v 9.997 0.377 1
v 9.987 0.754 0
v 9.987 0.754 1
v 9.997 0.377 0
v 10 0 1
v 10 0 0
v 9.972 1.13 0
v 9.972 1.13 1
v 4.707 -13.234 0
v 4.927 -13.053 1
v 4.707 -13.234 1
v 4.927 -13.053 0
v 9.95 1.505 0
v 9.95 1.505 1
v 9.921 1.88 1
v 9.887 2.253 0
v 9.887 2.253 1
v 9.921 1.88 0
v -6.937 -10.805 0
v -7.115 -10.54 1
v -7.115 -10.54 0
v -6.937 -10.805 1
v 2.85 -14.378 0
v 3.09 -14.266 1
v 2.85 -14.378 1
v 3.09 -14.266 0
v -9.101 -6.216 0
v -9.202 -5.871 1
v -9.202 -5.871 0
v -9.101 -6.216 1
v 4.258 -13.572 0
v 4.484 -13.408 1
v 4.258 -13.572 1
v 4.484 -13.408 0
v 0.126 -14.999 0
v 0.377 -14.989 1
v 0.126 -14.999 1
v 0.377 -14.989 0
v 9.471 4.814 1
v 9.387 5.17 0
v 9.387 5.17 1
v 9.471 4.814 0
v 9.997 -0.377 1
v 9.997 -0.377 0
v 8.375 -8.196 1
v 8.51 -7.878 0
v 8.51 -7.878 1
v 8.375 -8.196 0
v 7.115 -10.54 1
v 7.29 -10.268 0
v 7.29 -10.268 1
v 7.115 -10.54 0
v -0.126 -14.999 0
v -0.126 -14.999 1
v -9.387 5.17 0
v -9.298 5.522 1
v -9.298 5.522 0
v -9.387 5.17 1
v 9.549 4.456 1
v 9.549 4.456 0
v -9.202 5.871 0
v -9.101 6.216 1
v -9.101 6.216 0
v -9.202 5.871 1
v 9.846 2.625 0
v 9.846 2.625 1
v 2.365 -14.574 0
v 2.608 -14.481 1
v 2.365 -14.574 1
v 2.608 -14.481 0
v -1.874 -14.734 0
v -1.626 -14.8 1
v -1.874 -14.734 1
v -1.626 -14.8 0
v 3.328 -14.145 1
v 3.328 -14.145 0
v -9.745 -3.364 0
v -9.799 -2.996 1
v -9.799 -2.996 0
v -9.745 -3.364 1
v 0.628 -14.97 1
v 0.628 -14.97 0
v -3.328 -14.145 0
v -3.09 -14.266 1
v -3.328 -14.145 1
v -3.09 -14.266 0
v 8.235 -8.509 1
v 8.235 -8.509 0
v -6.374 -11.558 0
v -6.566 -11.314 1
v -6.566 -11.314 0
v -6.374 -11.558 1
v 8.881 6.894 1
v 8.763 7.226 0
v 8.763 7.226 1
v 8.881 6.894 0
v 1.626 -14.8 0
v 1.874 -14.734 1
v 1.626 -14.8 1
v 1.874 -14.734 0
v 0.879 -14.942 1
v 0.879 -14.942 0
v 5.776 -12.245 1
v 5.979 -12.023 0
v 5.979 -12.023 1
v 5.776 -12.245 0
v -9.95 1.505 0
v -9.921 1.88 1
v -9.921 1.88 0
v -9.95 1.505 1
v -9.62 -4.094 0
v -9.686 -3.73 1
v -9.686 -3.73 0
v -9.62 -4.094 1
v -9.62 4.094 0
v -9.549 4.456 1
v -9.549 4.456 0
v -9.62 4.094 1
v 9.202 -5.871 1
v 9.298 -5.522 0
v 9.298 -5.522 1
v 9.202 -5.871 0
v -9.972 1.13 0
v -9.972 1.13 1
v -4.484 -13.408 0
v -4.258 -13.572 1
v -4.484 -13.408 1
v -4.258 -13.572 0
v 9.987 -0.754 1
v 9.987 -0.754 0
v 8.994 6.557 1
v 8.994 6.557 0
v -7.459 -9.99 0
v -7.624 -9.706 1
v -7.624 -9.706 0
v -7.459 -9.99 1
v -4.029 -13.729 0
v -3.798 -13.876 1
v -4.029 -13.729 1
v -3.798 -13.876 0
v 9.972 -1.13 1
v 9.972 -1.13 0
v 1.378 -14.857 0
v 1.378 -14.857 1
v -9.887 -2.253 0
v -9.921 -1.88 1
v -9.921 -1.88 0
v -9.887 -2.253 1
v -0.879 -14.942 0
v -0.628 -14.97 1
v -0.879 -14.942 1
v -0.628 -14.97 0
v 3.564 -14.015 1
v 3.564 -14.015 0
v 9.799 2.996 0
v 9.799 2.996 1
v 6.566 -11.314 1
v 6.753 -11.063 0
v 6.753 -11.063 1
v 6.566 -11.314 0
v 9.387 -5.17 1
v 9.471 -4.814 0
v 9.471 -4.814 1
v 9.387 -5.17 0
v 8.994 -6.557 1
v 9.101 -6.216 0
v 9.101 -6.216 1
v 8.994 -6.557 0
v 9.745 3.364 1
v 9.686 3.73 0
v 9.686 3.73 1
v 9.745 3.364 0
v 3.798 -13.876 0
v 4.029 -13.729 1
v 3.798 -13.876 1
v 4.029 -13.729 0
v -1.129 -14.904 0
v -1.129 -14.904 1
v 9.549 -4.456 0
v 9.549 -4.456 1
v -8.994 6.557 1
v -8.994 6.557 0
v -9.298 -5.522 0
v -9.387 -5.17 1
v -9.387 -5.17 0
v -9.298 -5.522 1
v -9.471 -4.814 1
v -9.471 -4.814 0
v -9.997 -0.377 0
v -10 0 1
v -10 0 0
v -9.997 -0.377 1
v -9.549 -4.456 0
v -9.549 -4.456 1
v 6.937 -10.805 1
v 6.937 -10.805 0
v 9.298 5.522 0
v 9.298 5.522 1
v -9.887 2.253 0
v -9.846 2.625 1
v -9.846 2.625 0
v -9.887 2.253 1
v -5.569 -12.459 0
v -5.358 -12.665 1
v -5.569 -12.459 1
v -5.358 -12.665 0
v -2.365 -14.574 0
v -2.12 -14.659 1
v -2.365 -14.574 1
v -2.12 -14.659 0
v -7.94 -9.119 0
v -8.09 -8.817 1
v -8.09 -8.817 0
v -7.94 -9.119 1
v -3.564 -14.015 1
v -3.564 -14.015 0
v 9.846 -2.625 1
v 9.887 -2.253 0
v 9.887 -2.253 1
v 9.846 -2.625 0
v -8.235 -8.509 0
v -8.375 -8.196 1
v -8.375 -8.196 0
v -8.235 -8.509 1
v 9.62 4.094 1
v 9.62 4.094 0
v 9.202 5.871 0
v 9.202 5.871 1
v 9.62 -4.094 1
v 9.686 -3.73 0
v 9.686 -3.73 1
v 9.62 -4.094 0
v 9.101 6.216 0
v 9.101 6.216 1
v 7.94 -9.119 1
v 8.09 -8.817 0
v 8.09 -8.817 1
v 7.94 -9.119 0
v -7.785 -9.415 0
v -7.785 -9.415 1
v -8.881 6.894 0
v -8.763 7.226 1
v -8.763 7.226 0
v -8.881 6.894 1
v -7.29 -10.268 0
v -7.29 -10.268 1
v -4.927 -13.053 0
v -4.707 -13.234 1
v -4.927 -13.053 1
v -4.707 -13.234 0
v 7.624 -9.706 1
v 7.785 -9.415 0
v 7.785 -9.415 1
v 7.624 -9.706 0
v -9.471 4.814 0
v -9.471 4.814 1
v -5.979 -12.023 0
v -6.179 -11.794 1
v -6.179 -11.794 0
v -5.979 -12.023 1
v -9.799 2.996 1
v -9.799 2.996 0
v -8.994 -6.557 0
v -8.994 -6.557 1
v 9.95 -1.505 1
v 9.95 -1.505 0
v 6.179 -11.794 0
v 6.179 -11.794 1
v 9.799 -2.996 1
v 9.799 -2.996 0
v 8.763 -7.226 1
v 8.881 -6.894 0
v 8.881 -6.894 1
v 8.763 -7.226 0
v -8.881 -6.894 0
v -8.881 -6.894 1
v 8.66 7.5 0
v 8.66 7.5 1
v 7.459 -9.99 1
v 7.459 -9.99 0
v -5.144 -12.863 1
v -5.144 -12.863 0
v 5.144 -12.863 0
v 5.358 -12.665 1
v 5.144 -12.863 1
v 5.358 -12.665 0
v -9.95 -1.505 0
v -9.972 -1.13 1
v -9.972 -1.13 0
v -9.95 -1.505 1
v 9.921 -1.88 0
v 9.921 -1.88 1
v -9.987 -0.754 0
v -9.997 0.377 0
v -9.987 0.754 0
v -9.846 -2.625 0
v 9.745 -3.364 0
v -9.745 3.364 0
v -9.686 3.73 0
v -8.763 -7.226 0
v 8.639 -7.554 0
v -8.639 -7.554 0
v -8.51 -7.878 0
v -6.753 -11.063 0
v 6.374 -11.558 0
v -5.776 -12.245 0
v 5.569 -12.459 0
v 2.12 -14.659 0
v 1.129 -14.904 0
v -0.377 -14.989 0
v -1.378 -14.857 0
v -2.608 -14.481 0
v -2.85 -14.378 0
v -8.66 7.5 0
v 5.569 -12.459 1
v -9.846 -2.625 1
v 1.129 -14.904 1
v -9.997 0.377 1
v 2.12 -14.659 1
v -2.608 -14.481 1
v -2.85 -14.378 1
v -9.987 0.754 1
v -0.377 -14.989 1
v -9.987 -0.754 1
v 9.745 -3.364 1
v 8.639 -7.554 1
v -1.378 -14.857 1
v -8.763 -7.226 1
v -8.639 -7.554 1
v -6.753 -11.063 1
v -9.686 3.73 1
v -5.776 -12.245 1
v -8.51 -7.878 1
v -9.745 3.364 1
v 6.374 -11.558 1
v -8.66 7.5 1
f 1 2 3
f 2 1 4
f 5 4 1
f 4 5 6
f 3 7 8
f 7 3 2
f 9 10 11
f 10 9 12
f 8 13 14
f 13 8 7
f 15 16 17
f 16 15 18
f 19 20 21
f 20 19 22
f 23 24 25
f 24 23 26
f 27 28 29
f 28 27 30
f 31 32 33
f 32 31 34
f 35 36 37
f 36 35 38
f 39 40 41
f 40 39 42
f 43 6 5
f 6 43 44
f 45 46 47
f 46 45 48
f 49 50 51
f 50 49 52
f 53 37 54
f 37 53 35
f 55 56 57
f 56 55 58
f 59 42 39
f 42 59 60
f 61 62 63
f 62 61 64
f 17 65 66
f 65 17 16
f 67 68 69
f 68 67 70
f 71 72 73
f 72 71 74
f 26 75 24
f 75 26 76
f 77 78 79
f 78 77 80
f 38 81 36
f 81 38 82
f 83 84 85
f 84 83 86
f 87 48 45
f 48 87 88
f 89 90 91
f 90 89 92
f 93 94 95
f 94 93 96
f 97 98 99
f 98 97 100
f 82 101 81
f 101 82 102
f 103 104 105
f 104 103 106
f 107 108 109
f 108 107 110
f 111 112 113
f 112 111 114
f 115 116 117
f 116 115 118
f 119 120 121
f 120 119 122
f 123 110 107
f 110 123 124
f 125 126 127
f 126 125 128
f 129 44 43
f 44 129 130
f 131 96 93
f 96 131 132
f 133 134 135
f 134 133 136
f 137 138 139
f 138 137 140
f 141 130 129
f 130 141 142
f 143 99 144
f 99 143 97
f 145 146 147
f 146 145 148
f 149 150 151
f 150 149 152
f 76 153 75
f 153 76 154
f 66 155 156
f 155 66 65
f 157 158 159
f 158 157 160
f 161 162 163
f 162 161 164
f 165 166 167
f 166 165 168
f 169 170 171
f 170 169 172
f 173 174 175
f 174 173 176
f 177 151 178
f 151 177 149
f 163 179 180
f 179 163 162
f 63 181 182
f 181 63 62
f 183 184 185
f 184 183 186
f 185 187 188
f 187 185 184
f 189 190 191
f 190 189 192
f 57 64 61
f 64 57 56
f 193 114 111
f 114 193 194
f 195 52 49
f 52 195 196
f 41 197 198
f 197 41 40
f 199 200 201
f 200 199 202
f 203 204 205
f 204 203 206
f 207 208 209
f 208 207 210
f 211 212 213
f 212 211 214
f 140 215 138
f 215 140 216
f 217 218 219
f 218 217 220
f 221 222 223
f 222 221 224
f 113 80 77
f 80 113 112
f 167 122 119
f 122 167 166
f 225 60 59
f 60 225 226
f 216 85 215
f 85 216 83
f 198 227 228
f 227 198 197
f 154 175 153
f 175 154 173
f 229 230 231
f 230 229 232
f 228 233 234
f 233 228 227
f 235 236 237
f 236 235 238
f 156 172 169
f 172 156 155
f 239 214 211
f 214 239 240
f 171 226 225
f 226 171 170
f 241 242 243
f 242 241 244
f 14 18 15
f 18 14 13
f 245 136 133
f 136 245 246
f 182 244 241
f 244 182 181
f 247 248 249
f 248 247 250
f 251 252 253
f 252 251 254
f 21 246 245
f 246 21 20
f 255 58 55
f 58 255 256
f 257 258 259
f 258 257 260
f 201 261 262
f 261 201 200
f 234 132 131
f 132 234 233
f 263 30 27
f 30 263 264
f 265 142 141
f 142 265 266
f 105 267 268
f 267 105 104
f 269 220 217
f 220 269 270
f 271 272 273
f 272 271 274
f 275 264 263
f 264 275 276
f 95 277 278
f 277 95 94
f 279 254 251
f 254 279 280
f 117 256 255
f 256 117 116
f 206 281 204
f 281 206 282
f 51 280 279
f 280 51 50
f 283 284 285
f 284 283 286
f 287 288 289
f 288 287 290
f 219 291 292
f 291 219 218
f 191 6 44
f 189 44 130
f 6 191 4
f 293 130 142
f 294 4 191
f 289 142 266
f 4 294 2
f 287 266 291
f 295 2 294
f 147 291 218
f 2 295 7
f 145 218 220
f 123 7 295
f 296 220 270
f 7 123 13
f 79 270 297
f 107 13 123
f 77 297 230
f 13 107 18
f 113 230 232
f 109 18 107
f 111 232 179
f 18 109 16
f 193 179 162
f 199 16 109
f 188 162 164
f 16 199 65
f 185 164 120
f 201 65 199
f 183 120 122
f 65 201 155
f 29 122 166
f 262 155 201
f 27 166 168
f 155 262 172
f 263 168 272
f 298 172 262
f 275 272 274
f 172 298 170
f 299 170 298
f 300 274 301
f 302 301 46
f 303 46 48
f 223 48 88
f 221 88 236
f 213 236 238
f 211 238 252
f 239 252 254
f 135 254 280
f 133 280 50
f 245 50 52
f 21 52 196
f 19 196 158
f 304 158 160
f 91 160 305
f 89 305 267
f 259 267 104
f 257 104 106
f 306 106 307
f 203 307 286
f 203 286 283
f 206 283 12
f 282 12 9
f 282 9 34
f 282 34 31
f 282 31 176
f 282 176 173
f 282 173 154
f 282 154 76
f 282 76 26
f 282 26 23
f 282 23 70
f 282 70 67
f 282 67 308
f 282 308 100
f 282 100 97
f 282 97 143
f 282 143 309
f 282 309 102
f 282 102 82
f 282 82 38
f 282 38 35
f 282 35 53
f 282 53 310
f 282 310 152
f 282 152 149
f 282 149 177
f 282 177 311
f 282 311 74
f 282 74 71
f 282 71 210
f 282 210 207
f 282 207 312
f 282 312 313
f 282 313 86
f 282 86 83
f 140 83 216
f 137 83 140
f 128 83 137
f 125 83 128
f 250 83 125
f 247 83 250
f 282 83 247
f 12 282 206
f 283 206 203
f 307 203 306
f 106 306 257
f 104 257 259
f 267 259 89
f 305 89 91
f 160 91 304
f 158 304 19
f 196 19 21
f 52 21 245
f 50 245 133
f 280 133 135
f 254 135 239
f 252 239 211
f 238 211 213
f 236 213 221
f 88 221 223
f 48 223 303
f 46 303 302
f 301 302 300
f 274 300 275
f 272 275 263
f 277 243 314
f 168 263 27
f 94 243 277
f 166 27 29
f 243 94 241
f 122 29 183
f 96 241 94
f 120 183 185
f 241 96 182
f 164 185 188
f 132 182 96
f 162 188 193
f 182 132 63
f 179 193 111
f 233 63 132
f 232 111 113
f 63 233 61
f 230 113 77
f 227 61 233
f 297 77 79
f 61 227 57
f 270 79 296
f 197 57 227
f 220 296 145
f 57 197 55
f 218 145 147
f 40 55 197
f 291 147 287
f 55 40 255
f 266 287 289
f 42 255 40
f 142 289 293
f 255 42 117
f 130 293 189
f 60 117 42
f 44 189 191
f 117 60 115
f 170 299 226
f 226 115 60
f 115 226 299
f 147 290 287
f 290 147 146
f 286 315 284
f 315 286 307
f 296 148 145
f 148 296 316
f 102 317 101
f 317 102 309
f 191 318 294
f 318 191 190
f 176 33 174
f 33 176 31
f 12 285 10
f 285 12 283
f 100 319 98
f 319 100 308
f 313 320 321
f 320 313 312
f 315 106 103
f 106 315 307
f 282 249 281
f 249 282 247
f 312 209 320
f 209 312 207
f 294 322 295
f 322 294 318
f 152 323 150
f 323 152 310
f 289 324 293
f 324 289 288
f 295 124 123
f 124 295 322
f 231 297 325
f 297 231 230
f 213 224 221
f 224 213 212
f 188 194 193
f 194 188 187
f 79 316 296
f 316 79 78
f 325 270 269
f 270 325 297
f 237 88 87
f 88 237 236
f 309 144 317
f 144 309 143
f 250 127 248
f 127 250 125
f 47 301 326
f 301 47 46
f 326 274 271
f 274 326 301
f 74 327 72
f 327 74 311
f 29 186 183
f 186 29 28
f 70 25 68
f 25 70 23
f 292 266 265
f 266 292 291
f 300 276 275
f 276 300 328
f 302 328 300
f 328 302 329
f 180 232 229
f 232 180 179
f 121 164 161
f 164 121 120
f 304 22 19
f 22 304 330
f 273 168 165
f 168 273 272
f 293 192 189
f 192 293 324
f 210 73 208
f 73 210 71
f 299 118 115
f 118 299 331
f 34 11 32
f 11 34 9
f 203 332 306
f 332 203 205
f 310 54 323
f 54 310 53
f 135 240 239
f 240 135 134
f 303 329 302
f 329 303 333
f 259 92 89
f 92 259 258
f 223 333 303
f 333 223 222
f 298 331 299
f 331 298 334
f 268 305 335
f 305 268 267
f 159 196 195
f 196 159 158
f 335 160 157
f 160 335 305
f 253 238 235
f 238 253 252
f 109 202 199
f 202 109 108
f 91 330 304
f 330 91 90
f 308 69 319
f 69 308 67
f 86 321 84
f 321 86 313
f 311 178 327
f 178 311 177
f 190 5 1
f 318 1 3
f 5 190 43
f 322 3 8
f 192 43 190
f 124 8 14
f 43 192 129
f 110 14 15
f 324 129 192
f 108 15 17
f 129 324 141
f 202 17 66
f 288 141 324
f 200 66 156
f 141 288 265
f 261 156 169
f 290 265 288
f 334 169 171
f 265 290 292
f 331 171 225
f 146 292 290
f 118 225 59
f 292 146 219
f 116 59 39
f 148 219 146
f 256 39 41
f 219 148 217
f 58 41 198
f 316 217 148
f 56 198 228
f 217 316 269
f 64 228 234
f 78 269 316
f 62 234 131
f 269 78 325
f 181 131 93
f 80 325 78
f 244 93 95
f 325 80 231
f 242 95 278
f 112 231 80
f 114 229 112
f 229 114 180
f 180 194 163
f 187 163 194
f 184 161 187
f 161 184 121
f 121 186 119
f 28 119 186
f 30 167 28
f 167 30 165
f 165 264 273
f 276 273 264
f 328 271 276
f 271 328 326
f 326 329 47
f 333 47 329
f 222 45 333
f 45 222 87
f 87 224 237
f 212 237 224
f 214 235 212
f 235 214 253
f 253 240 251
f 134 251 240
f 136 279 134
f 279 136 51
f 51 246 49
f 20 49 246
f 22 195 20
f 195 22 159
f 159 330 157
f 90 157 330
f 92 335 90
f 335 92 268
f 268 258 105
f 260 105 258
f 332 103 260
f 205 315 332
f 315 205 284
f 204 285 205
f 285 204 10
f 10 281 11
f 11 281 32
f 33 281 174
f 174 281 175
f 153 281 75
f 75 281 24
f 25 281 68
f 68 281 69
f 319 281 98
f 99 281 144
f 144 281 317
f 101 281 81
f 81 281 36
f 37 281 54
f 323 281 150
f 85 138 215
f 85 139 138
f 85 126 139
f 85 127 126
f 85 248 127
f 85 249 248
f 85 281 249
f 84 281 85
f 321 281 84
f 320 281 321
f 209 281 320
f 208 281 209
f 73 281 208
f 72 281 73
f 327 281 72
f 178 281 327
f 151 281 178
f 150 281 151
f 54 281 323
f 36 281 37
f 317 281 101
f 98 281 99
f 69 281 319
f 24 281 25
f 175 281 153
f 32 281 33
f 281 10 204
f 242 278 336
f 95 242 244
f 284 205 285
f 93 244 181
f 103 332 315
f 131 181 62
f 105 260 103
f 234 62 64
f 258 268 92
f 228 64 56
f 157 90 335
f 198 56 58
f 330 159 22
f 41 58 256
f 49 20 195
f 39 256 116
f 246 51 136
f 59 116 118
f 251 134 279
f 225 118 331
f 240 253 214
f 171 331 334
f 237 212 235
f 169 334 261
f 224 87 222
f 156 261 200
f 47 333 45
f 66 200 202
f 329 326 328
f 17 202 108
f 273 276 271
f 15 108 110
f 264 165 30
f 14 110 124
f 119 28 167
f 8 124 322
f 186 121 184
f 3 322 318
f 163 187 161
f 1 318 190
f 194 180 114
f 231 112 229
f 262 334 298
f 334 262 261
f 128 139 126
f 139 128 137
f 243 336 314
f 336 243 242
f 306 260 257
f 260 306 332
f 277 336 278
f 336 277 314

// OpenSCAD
$fn = 250;

module hat()
{
    
}

module leg(w=10, h=15, t=1, s=0.7)
{
    scale([w,h,t])
    difference()
    {
        cylinder();
        #translate([-1,2*0.75-1,-0.5]) cube([2,2,2]);
    }
}

module mushroom()
{
    leg();
    
}
    
mushroom();
